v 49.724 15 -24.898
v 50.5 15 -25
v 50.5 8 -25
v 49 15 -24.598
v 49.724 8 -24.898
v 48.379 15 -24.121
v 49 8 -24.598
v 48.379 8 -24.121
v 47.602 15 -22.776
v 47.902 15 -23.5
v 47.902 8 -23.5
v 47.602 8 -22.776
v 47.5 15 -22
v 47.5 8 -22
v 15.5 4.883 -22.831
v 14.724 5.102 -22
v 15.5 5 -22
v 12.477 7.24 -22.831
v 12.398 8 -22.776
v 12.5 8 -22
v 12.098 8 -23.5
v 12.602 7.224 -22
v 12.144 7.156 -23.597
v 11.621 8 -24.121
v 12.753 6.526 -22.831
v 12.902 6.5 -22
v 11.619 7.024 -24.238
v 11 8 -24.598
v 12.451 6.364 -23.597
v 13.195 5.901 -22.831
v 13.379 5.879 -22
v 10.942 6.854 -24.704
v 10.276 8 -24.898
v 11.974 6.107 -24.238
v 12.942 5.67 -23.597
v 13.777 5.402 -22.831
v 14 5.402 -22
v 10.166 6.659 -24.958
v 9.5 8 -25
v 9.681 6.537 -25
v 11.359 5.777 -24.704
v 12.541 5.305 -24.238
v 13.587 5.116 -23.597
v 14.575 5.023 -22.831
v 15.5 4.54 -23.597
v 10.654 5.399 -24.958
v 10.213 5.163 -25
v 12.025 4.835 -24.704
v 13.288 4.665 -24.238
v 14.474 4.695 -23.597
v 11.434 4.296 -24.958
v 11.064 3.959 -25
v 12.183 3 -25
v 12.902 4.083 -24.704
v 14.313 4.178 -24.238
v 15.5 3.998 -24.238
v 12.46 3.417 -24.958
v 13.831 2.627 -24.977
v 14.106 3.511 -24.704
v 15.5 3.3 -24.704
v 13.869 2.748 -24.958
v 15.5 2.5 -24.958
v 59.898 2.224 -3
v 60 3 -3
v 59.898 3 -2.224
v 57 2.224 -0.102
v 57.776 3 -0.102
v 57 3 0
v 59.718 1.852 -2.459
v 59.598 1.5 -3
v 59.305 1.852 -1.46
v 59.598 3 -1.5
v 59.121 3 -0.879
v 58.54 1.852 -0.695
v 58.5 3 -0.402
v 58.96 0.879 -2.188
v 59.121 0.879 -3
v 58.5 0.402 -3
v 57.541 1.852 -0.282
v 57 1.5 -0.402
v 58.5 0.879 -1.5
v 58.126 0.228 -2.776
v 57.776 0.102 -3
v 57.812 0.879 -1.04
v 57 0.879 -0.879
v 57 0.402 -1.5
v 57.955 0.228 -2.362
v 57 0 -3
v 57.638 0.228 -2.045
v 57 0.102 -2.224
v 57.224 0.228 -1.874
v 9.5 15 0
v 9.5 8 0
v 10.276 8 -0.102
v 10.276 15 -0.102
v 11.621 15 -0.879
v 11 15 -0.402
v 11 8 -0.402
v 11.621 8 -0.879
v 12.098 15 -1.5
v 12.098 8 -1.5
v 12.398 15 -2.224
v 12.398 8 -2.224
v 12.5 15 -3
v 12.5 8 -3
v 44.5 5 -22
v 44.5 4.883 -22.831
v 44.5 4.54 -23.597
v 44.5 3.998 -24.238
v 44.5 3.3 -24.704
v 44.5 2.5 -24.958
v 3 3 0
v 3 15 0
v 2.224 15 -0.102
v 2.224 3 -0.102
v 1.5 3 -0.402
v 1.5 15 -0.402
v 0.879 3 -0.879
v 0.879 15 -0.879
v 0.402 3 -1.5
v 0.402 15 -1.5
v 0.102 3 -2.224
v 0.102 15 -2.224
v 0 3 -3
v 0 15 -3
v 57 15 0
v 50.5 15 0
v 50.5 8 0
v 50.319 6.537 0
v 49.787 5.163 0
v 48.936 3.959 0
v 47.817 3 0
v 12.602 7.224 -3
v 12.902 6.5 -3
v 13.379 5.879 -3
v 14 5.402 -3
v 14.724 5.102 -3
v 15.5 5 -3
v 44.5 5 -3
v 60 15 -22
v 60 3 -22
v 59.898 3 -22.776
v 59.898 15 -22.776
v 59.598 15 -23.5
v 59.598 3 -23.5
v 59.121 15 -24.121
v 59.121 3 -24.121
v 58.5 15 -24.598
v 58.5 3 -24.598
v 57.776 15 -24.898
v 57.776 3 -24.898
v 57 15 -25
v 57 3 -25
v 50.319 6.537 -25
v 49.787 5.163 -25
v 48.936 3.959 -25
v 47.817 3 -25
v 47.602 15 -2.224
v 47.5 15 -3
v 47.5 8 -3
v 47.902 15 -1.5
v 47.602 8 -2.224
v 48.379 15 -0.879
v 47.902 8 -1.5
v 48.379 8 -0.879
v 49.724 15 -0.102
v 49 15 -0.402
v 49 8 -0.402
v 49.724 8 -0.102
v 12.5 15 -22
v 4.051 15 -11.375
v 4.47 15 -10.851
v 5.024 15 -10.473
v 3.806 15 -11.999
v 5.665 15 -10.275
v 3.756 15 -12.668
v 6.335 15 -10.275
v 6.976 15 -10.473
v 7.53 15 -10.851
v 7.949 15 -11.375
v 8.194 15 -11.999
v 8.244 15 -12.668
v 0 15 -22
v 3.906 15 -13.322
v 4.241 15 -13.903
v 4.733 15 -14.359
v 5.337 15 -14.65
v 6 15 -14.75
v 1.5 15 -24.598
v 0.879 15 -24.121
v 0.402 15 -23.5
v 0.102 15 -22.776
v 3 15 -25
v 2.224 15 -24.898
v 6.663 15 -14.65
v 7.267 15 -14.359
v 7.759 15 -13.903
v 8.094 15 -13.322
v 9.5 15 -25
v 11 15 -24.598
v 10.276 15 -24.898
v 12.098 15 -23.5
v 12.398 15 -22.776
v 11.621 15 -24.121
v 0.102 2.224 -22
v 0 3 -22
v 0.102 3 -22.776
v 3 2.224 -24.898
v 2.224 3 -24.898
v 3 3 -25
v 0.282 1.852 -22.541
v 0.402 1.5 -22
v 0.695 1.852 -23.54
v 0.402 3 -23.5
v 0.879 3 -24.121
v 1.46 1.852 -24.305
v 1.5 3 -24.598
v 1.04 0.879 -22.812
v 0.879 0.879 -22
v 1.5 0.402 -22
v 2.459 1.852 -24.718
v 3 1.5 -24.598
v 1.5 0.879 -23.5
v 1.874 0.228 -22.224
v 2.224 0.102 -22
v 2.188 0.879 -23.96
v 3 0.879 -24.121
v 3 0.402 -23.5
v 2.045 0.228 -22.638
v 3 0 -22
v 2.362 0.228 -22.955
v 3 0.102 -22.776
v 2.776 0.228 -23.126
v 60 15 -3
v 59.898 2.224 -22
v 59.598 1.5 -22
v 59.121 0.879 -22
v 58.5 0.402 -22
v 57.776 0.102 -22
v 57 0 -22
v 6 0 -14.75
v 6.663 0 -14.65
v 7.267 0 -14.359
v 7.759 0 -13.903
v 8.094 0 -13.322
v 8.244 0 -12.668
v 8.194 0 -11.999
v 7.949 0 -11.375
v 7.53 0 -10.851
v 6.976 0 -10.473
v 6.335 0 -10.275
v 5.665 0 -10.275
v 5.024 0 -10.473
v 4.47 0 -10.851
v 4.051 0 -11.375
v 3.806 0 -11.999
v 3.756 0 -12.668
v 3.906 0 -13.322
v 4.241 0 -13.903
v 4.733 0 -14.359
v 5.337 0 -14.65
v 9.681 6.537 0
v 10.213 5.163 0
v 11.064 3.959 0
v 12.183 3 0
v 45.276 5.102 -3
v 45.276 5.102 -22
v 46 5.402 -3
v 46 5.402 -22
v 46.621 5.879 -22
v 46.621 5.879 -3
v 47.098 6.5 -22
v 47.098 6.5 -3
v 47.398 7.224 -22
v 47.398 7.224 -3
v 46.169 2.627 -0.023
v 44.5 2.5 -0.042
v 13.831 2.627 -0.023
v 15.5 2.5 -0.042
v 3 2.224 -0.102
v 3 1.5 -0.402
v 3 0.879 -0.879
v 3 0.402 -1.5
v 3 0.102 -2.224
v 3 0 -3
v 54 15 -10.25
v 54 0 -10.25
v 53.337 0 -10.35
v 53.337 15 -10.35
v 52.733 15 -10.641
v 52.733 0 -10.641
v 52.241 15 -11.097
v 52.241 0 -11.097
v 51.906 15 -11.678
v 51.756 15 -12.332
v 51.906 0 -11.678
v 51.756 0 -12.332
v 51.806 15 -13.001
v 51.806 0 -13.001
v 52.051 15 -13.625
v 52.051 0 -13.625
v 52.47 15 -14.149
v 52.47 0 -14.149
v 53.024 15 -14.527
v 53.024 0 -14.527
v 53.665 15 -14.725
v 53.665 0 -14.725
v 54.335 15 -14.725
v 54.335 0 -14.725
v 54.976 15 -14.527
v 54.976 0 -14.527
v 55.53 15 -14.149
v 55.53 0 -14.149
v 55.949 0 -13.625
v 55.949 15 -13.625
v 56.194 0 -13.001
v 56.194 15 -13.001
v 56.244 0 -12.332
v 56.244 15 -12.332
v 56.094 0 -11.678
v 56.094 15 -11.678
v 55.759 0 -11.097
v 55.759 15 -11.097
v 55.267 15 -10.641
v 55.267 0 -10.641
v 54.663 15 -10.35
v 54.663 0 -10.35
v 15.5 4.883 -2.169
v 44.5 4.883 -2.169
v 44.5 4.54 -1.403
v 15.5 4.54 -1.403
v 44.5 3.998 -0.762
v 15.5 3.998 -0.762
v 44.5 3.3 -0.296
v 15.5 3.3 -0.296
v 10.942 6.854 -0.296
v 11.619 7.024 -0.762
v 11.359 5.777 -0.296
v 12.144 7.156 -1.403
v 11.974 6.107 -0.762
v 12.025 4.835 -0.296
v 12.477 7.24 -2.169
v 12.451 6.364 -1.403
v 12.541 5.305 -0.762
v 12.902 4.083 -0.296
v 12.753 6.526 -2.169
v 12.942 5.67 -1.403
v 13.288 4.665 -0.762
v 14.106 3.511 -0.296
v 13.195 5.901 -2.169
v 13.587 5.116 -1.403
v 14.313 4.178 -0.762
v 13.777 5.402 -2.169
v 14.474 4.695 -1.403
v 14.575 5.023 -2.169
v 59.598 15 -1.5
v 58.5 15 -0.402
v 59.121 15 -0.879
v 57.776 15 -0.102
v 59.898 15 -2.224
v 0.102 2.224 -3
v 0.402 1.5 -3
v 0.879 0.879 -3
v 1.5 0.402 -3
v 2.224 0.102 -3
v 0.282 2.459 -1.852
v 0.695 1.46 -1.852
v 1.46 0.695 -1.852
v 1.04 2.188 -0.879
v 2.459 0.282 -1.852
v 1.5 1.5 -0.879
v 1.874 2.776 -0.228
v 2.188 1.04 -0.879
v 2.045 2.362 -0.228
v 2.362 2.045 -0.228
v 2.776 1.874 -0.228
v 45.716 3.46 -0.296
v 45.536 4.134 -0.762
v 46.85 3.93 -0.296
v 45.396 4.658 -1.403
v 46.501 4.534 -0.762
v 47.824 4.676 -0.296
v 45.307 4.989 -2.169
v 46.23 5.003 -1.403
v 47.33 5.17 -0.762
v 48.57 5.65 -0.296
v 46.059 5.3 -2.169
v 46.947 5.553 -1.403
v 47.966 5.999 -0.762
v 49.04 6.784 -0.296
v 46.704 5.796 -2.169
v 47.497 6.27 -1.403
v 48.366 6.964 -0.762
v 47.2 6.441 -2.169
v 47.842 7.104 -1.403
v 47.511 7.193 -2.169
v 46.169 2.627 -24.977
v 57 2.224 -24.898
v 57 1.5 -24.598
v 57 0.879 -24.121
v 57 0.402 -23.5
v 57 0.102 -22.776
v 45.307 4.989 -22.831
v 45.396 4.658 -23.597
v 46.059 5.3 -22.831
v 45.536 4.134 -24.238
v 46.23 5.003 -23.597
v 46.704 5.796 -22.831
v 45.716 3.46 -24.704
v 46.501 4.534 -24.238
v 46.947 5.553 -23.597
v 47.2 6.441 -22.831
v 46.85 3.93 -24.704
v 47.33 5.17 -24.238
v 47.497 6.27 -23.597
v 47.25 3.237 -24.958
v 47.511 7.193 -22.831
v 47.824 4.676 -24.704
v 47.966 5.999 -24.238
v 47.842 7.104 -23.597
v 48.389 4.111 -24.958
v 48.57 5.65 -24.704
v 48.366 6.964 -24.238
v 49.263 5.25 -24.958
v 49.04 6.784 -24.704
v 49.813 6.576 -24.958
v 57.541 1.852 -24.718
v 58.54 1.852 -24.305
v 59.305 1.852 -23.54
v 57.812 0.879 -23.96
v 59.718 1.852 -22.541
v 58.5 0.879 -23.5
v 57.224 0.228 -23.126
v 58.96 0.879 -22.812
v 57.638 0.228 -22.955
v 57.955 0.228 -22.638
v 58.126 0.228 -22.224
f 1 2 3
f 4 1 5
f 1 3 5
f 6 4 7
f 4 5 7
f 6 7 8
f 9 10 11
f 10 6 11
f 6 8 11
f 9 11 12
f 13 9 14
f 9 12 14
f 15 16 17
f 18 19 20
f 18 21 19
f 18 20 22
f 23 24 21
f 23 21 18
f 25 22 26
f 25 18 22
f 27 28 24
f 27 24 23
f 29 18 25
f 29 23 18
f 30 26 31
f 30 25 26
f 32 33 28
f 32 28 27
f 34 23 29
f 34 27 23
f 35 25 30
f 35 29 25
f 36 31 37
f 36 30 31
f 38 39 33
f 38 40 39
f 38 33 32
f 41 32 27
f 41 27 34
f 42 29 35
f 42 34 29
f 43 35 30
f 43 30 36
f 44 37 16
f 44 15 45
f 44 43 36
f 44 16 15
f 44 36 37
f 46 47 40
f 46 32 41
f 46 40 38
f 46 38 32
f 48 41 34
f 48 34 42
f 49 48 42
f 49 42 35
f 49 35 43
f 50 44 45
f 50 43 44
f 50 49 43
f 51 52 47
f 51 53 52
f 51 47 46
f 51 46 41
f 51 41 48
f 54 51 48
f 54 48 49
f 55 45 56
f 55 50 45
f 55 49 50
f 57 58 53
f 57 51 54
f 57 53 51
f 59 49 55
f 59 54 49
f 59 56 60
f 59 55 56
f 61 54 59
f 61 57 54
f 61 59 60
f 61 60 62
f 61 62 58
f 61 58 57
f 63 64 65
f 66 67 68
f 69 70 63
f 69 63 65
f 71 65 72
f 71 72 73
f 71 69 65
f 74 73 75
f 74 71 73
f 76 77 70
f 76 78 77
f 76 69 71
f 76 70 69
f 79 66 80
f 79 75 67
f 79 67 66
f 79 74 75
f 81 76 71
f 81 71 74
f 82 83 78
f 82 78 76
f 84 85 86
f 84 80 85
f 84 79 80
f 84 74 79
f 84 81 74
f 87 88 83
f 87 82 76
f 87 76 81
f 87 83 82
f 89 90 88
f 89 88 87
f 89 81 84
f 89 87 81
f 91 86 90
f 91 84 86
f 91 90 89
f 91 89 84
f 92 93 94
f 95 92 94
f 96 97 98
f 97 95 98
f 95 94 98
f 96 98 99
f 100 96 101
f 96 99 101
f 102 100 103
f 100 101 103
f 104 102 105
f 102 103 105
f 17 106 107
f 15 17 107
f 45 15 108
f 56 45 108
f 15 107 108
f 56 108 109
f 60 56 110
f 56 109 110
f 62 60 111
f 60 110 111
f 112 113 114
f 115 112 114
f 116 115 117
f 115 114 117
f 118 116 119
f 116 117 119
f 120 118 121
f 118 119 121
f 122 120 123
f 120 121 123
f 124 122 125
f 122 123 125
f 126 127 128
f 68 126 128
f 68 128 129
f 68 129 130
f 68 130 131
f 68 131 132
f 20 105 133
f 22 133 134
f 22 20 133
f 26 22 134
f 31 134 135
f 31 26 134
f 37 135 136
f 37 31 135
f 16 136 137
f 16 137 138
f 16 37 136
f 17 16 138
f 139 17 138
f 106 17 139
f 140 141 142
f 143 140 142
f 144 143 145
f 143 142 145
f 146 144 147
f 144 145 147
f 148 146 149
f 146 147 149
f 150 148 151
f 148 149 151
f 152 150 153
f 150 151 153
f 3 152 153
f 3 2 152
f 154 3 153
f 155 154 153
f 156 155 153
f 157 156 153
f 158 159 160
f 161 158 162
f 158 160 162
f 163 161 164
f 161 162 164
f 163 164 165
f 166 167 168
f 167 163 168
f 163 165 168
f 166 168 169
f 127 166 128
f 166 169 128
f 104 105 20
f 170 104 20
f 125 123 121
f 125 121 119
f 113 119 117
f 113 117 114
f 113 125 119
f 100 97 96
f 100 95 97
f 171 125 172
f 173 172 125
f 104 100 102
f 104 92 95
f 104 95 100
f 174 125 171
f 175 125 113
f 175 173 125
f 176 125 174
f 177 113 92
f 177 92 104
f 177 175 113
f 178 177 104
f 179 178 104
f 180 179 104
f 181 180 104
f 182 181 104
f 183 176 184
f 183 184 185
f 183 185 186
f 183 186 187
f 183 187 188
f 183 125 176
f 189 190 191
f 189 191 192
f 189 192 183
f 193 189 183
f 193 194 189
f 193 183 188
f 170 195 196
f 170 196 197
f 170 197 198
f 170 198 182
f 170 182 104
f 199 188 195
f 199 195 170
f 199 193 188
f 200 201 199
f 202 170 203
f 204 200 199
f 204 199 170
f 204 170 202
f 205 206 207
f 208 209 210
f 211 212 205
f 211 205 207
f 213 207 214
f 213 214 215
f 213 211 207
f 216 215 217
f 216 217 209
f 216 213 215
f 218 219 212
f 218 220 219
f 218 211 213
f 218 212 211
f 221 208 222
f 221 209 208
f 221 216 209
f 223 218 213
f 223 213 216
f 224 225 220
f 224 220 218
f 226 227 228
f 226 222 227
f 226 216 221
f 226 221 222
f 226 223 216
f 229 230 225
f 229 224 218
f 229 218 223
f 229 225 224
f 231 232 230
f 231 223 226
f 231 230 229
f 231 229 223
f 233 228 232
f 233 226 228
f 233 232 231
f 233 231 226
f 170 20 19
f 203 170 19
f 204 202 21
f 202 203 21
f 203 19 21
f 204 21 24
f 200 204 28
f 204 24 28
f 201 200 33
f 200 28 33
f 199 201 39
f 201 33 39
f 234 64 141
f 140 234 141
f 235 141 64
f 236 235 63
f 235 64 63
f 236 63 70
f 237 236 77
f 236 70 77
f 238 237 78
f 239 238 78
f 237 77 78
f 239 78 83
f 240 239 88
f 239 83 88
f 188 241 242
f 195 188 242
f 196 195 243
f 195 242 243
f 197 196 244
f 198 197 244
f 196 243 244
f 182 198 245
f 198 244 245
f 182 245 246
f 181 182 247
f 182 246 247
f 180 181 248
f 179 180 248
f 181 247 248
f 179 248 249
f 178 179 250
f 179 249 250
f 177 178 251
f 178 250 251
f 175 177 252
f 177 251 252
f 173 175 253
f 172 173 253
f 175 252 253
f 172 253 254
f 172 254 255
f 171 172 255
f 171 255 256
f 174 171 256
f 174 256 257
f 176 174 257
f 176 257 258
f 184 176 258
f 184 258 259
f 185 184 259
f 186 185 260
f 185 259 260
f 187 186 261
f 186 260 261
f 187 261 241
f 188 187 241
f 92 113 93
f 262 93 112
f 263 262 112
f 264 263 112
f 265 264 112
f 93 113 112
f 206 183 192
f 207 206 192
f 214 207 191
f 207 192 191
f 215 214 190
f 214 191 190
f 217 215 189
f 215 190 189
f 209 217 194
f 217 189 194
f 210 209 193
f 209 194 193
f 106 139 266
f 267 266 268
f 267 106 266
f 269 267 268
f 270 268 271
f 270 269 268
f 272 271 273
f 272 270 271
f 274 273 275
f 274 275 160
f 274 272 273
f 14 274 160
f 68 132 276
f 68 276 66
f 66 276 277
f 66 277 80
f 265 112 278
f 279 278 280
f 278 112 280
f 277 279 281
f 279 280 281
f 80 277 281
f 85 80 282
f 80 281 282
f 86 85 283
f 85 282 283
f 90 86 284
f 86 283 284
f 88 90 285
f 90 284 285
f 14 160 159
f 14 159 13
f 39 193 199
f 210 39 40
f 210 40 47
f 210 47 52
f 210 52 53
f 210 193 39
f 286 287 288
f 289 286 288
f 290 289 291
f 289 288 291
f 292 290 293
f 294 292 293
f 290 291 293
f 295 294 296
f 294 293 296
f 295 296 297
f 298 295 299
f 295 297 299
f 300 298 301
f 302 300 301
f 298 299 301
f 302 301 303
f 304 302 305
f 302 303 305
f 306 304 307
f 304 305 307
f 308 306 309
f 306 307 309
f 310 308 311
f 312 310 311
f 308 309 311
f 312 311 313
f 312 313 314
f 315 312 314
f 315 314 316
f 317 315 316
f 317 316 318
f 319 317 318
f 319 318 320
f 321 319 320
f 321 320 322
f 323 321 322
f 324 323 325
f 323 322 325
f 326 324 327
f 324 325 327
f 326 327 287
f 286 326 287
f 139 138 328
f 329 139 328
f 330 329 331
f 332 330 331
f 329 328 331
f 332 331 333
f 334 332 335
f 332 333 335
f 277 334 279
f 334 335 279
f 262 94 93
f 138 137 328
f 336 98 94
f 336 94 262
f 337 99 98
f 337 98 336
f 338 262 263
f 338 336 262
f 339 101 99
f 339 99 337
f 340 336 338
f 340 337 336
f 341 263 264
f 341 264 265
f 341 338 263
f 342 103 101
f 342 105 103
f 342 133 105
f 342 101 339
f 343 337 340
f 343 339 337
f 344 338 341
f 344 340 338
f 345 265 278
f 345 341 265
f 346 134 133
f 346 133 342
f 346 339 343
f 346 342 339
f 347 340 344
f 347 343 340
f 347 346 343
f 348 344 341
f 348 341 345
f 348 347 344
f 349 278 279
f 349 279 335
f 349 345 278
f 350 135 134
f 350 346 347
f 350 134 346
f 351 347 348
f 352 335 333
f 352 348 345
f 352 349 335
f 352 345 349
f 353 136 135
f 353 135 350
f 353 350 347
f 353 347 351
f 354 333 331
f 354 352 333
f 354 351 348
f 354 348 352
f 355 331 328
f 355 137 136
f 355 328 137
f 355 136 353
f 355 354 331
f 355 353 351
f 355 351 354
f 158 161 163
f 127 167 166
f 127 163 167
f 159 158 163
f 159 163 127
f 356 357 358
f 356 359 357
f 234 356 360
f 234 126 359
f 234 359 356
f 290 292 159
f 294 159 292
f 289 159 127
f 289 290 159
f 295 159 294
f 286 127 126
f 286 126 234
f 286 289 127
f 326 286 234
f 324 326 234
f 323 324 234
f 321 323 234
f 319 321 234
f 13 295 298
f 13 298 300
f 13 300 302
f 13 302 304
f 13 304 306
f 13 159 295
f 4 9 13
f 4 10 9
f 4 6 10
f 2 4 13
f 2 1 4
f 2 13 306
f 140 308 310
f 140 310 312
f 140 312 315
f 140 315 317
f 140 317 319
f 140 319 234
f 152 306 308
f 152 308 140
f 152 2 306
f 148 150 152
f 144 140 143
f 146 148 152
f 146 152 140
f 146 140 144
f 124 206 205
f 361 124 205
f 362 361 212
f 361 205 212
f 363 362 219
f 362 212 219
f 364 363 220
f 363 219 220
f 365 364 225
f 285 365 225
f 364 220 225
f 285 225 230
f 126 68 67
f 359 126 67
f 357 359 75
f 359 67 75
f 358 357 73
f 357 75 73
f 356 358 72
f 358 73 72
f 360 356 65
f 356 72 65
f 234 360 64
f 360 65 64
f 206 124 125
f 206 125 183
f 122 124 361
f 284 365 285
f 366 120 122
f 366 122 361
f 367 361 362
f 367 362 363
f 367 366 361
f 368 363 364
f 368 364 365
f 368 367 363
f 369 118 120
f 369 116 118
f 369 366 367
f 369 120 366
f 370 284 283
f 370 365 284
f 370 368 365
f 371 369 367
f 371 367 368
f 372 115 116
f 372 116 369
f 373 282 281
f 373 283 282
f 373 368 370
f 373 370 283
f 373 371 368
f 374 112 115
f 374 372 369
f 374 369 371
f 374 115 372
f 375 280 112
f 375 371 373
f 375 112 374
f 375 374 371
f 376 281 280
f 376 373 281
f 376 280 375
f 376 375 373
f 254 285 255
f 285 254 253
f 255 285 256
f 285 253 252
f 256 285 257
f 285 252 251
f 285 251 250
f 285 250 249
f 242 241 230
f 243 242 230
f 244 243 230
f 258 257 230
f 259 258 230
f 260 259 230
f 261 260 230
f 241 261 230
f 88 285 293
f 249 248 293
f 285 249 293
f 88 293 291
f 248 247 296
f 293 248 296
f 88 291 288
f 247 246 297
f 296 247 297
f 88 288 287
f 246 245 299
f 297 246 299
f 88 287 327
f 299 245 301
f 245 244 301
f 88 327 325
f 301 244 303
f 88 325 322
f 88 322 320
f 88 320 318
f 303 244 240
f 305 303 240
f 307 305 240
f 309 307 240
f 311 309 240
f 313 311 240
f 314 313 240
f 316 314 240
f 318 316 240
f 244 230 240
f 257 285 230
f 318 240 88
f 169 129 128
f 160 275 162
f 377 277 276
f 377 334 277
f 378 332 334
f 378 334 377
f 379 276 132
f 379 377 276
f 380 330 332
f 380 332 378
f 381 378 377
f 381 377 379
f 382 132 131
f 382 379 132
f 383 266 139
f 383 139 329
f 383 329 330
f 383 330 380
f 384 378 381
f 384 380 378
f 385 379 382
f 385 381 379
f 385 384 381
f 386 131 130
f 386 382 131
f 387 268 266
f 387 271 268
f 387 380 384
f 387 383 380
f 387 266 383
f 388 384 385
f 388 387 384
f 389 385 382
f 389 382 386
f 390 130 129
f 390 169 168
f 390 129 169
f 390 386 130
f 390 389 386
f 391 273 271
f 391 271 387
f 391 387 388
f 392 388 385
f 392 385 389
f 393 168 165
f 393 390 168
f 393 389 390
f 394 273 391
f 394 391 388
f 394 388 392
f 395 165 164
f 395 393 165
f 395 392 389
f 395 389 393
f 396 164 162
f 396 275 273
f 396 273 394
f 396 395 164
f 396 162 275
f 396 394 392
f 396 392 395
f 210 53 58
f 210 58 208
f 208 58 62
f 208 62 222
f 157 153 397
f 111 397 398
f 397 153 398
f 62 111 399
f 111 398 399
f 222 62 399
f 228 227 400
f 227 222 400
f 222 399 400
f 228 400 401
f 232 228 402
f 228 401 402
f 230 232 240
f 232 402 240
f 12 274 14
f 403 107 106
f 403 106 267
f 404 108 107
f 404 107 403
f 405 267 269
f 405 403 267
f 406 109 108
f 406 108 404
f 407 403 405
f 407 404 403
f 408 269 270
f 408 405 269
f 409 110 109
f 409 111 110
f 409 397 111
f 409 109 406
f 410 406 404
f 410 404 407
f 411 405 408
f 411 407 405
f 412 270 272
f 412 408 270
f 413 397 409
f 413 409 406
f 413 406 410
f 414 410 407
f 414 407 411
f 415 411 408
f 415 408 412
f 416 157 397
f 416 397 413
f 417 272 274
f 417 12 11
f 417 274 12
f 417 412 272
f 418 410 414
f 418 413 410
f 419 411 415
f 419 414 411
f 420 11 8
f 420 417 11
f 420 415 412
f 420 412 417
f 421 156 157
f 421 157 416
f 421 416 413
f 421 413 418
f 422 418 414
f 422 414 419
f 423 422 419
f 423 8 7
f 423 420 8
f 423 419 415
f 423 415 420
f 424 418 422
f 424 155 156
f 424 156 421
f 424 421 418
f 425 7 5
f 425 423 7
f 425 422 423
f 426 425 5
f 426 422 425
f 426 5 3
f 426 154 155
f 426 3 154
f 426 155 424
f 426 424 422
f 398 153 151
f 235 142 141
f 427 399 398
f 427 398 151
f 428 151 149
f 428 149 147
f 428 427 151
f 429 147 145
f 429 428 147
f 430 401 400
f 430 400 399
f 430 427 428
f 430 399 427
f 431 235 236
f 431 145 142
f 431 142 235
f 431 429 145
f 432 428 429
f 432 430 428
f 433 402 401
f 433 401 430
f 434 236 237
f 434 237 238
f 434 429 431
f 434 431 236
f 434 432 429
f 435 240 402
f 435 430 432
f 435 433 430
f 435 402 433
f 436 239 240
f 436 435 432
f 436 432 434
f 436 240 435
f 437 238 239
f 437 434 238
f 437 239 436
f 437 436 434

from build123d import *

# Parameters (mm, degrees)
SKETCH1_W           = 60
SKETCH1_H           = 25
BOSS_EXTRUDE1_DEPTH = 5
SKETCH2_W           = 12.5
SKETCH2_H           = 25
BOSS_EXTRUDE2_DEPTH = 10
SKETCH3_R           = 2.25
CUT_EXTRUDE1_DEPTH  = 15
FILLET1_R           = 3


with BuildPart() as part:
    # Sketch1 → Boss-Extrude1 (new body)
    with BuildSketch(Plane(origin=(0, 0, 0), x_dir=(1, 0, 0), z_dir=(0, 1, 0))):
        with Locations((30, 12.5)):
            Rectangle(SKETCH1_W, SKETCH1_H)
    extrude(amount=BOSS_EXTRUDE1_DEPTH)

    # Sketch2 → Boss-Extrude2 (add)
    with BuildSketch(Plane(origin=(0, 5, 0), x_dir=(1, 0, 0), z_dir=(0, 1, 0))):
        with Locations((6.25, 12.5)):
            Rectangle(SKETCH2_W, SKETCH2_H)
        with Locations((53.75, 12.5)):
            Rectangle(SKETCH2_W, SKETCH2_H)
    extrude(amount=BOSS_EXTRUDE2_DEPTH)

    # Sketch3 → Cut-Extrude1 (cut)
    with BuildSketch(Plane.XZ):
        with Locations(Location((6, -12.5, 0), (0, 0, 270))):
            Circle(SKETCH3_R)
        with Locations(Location((54, -12.5, 0), (0, 0, 90))):
            Circle(SKETCH3_R)
    extrude(amount=-CUT_EXTRUDE1_DEPTH, mode=Mode.SUBTRACT)

    # Fillet1
    # the kernel refuses this fillet: 3 mm, written as the material it adds along each edge
    with BuildSketch(Plane(origin=(12.5, 5, -25), x_dir=(0, 1, 0), z_dir=(0, 0, 1)), Plane(origin=(47.5, 5, -25), x_dir=(-1, 0, 0), z_dir=(0, 0, 1))) as fillet1_piece_1:
        with BuildLine():
            CenterArc((FILLET1_R, -FILLET1_R), FILLET1_R, 90, 90)
            Line((0, -FILLET1_R), (0, 0))
            Line((0, 0), (FILLET1_R, 0))
        make_face()
    extrude(amount=25)
    # the kernel refuses this fillet: 3 mm, written as the material it takes off along each edge
    with BuildSketch(Plane(origin=(57, 3, -22), x_dir=(0, 0, -1), z_dir=(0, -1, 0))) as fillet1_2_piece_1_section:
        Polygon((0, 0), (FILLET1_R * 1.02, 0), (FILLET1_R * 1.02, FILLET1_R * 1.02), (0, FILLET1_R * 1.02), align=None)
    fillet1_2_piece_1 = extrude(amount=FILLET1_R * 1.02, mode=Mode.PRIVATE)
    fillet1_2_piece_1 = fillet1_2_piece_1 - Plane(origin=(57, 3, -22), x_dir=(-0.7071067811865475, 0, 0.7071067811865475), z_dir=(0, -1, 0)) * Sphere(FILLET1_R, mode=Mode.PRIVATE)
    add(fillet1_2_piece_1, mode=Mode.SUBTRACT)
    with BuildSketch(Plane(origin=(3, 3, -22), x_dir=(0, 0, -1), z_dir=(0, -1, 0))) as fillet1_2_piece_2_section:
        Polygon((0, 0), (FILLET1_R * 1.02, 0), (FILLET1_R * 1.02, -FILLET1_R * 1.02), (0, -FILLET1_R * 1.02), align=None)
    fillet1_2_piece_2 = extrude(amount=FILLET1_R * 1.02, mode=Mode.PRIVATE)
    fillet1_2_piece_2 = fillet1_2_piece_2 - Plane(origin=(3, 3, -22), x_dir=(0.7071067811865475, 0, 0.7071067811865475), z_dir=(0, -1, 0)) * Sphere(FILLET1_R, mode=Mode.PRIVATE)
    add(fillet1_2_piece_2, mode=Mode.SUBTRACT)
    with BuildSketch(Plane(origin=(57, 3, -3), x_dir=(0, 0, 1), z_dir=(0, -1, 0))) as fillet1_2_piece_3_section:
        Polygon((0, 0), (FILLET1_R * 1.02, 0), (FILLET1_R * 1.02, -FILLET1_R * 1.02), (0, -FILLET1_R * 1.02), align=None)
    fillet1_2_piece_3 = extrude(amount=FILLET1_R * 1.02, mode=Mode.PRIVATE)
    fillet1_2_piece_3 = fillet1_2_piece_3 - Plane(origin=(57, 3, -3), x_dir=(-0.7071067811865475, 0, -0.7071067811865475), z_dir=(0, -1, 0)) * Sphere(FILLET1_R, mode=Mode.PRIVATE)
    add(fillet1_2_piece_3, mode=Mode.SUBTRACT)
    with BuildSketch(Plane(origin=(3, 3, -3), x_dir=(0, -1, 0), z_dir=(0, 0, 1))) as fillet1_2_piece_4_section:
        Polygon((0, 0), (FILLET1_R * 1.02, 0), (FILLET1_R * 1.02, -FILLET1_R * 1.02), (0, -FILLET1_R * 1.02), align=None)
    fillet1_2_piece_4 = extrude(amount=FILLET1_R * 1.02, mode=Mode.PRIVATE)
    fillet1_2_piece_4 = fillet1_2_piece_4 - Plane(origin=(3, 3, -3), x_dir=(0.7071067811865475, 0.7071067811865475, 0), z_dir=(0, 0, 1)) * Sphere(FILLET1_R, mode=Mode.PRIVATE)
    add(fillet1_2_piece_4, mode=Mode.SUBTRACT)
    with BuildSketch(Plane(origin=(57, 0, -25), x_dir=(0, 0, 1), z_dir=(-1, 0, 0))) as fillet1_2_piece_5:
        with BuildLine():
            CenterArc((FILLET1_R, FILLET1_R), FILLET1_R, 180, 90)
            Line((0, FILLET1_R), (0, 0))
            Line((0, 0), (FILLET1_R, 0))
        make_face()
    extrude(amount=54, mode=Mode.SUBTRACT)
    with BuildSketch(Plane(origin=(60, 0, -3), x_dir=(0, 1, 0), z_dir=(0, 0, -1)), Plane(origin=(0, 0, -22), x_dir=(0, 1, 0), z_dir=(0, 0, 1))) as fillet1_2_piece_6:
        with BuildLine():
            CenterArc((FILLET1_R, -FILLET1_R), FILLET1_R, 90, 90)
            Line((0, -FILLET1_R), (0, 0))
            Line((0, 0), (FILLET1_R, 0))
        make_face()
    extrude(amount=19, mode=Mode.SUBTRACT)
    with BuildSketch(Plane(origin=(3, 0, 0), x_dir=(0, 1, 0), z_dir=(1, 0, 0))) as fillet1_2_piece_7:
        with BuildLine():
            CenterArc((FILLET1_R, -FILLET1_R), FILLET1_R, 90, 90)
            Line((0, -FILLET1_R), (0, 0))
            Line((0, 0), (FILLET1_R, 0))
        make_face()
    extrude(amount=54, mode=Mode.SUBTRACT)
    with BuildSketch(Plane(origin=(0, 22.5, -25), x_dir=(0, 0, 1), z_dir=(0, -1, 0)), Plane(origin=(60, 3, -25), x_dir=(0, 0, 1), z_dir=(0, 1, 0)), Plane(origin=(60, 3, 0), x_dir=(-1, 0, 0), z_dir=(0, 1, 0)), Plane(origin=(0, 22.5, 0), x_dir=(1, 0, 0), z_dir=(0, -1, 0))) as fillet1_2_piece_8:
        with BuildLine():
            CenterArc((FILLET1_R, -FILLET1_R), FILLET1_R, 90, 90)
            Line((0, -FILLET1_R), (0, 0))
            Line((0, 0), (FILLET1_R, 0))
        make_face()
    extrude(amount=19.5, mode=Mode.SUBTRACT)
    # the kernel refuses this fillet: 3 mm, written as the material it takes off along each edge
    with BuildSketch(Plane(origin=(15.5, 5, 0), x_dir=(0, -1, 0), z_dir=(1, 0, 0))) as fillet1_3_piece_1:
        with BuildLine():
            CenterArc((FILLET1_R, FILLET1_R), FILLET1_R, 180, 90)
            Line((0, FILLET1_R), (0, 0))
            Line((0, 0), (FILLET1_R, 0))
        make_face()
    extrude(amount=29, mode=Mode.SUBTRACT)
    with BuildSketch(Plane(origin=(12.5, 8, 0), x_dir=(-1, 0, 0), z_dir=(0, 1, 0)), Plane(origin=(12.5, 8, -25), x_dir=(0, 0, 1), z_dir=(0, 1, 0))) as fillet1_3_piece_2:
        with BuildLine():
            CenterArc((FILLET1_R, -FILLET1_R), FILLET1_R, 90, 90)
            Line((0, -FILLET1_R), (0, 0))
            Line((0, 0), (FILLET1_R, 0))
        make_face()
    extrude(amount=14.5, mode=Mode.SUBTRACT)
    with BuildSketch(Plane(origin=(44.5, 5, -25), x_dir=(0, 0, 1), z_dir=(-1, 0, 0))) as fillet1_3_piece_3:
        with BuildLine():
            CenterArc((FILLET1_R, -FILLET1_R), FILLET1_R, 90, 90)
            Line((0, -FILLET1_R), (0, 0))
            Line((0, 0), (FILLET1_R, 0))
        make_face()
    extrude(amount=29, mode=Mode.SUBTRACT)
    with BuildSketch(Plane(origin=(47.5, 8, -25), x_dir=(0, 0, 1), z_dir=(0, 1, 0)), Plane(origin=(47.5, 8, 0), x_dir=(1, 0, 0), z_dir=(0, 1, 0))) as fillet1_3_piece_4:
        with BuildLine():
            CenterArc((FILLET1_R, FILLET1_R), FILLET1_R, 180, 90)
            Line((0, FILLET1_R), (0, 0))
            Line((0, 0), (FILLET1_R, 0))
        make_face()
    extrude(amount=14.5, mode=Mode.SUBTRACT)
    with BuildSketch(Plane(origin=(44.5, 8, 0), x_dir=(0, -1, 0), z_dir=(-1, 0, 0))) as fillet1_3_piece_5:
        with BuildLine():
            CenterArc((3 + FILLET1_R, -FILLET1_R), FILLET1_R, 90, 90)
            Line((3, -FILLET1_R), (3, 0))
            Line((3, 0), (3 + FILLET1_R, 0))
        make_face()
    revolve(axis=Axis((44.5, 8, 0), (0, 0, 1)), revolution_arc=90, mode=Mode.SUBTRACT)
    with BuildSketch(Plane(origin=(44.5, 8, -25), x_dir=(0, -1, 0), z_dir=(-1, 0, 0))) as fillet1_3_piece_6:
        with BuildLine():
            CenterArc((3 + FILLET1_R, FILLET1_R), FILLET1_R, 180, 90)
            Line((3 + FILLET1_R, 0), (3, 0))
            Line((3, 0), (3, FILLET1_R))
        make_face()
    revolve(axis=Axis((44.5, 8, -25), (0, 0, 1)), revolution_arc=90, mode=Mode.SUBTRACT)
    with BuildSketch(Plane(origin=(15.5, 8, -25), x_dir=(-1, 0, 0), z_dir=(0, 1, 0))) as fillet1_3_piece_7:
        with BuildLine():
            CenterArc((3 + FILLET1_R, FILLET1_R), FILLET1_R, 180, 90)
            Line((3 + FILLET1_R, 0), (3, 0))
            Line((3, 0), (3, FILLET1_R))
        make_face()
    revolve(axis=Axis((15.5, 8, -25), (0, 0, 1)), revolution_arc=90, mode=Mode.SUBTRACT)
    with BuildSketch(Plane(origin=(15.5, 8, 0), x_dir=(-1, 0, 0), z_dir=(0, 1, 0))) as fillet1_3_piece_8:
        with BuildLine():
            CenterArc((3 + FILLET1_R, -FILLET1_R), FILLET1_R, 90, 90)
            Line((3, -FILLET1_R), (3, 0))
            Line((3, 0), (3 + FILLET1_R, 0))
        make_face()
    revolve(axis=Axis((15.5, 8, 0), (0, 0, 1)), revolution_arc=90, mode=Mode.SUBTRACT)


solid = part.part
